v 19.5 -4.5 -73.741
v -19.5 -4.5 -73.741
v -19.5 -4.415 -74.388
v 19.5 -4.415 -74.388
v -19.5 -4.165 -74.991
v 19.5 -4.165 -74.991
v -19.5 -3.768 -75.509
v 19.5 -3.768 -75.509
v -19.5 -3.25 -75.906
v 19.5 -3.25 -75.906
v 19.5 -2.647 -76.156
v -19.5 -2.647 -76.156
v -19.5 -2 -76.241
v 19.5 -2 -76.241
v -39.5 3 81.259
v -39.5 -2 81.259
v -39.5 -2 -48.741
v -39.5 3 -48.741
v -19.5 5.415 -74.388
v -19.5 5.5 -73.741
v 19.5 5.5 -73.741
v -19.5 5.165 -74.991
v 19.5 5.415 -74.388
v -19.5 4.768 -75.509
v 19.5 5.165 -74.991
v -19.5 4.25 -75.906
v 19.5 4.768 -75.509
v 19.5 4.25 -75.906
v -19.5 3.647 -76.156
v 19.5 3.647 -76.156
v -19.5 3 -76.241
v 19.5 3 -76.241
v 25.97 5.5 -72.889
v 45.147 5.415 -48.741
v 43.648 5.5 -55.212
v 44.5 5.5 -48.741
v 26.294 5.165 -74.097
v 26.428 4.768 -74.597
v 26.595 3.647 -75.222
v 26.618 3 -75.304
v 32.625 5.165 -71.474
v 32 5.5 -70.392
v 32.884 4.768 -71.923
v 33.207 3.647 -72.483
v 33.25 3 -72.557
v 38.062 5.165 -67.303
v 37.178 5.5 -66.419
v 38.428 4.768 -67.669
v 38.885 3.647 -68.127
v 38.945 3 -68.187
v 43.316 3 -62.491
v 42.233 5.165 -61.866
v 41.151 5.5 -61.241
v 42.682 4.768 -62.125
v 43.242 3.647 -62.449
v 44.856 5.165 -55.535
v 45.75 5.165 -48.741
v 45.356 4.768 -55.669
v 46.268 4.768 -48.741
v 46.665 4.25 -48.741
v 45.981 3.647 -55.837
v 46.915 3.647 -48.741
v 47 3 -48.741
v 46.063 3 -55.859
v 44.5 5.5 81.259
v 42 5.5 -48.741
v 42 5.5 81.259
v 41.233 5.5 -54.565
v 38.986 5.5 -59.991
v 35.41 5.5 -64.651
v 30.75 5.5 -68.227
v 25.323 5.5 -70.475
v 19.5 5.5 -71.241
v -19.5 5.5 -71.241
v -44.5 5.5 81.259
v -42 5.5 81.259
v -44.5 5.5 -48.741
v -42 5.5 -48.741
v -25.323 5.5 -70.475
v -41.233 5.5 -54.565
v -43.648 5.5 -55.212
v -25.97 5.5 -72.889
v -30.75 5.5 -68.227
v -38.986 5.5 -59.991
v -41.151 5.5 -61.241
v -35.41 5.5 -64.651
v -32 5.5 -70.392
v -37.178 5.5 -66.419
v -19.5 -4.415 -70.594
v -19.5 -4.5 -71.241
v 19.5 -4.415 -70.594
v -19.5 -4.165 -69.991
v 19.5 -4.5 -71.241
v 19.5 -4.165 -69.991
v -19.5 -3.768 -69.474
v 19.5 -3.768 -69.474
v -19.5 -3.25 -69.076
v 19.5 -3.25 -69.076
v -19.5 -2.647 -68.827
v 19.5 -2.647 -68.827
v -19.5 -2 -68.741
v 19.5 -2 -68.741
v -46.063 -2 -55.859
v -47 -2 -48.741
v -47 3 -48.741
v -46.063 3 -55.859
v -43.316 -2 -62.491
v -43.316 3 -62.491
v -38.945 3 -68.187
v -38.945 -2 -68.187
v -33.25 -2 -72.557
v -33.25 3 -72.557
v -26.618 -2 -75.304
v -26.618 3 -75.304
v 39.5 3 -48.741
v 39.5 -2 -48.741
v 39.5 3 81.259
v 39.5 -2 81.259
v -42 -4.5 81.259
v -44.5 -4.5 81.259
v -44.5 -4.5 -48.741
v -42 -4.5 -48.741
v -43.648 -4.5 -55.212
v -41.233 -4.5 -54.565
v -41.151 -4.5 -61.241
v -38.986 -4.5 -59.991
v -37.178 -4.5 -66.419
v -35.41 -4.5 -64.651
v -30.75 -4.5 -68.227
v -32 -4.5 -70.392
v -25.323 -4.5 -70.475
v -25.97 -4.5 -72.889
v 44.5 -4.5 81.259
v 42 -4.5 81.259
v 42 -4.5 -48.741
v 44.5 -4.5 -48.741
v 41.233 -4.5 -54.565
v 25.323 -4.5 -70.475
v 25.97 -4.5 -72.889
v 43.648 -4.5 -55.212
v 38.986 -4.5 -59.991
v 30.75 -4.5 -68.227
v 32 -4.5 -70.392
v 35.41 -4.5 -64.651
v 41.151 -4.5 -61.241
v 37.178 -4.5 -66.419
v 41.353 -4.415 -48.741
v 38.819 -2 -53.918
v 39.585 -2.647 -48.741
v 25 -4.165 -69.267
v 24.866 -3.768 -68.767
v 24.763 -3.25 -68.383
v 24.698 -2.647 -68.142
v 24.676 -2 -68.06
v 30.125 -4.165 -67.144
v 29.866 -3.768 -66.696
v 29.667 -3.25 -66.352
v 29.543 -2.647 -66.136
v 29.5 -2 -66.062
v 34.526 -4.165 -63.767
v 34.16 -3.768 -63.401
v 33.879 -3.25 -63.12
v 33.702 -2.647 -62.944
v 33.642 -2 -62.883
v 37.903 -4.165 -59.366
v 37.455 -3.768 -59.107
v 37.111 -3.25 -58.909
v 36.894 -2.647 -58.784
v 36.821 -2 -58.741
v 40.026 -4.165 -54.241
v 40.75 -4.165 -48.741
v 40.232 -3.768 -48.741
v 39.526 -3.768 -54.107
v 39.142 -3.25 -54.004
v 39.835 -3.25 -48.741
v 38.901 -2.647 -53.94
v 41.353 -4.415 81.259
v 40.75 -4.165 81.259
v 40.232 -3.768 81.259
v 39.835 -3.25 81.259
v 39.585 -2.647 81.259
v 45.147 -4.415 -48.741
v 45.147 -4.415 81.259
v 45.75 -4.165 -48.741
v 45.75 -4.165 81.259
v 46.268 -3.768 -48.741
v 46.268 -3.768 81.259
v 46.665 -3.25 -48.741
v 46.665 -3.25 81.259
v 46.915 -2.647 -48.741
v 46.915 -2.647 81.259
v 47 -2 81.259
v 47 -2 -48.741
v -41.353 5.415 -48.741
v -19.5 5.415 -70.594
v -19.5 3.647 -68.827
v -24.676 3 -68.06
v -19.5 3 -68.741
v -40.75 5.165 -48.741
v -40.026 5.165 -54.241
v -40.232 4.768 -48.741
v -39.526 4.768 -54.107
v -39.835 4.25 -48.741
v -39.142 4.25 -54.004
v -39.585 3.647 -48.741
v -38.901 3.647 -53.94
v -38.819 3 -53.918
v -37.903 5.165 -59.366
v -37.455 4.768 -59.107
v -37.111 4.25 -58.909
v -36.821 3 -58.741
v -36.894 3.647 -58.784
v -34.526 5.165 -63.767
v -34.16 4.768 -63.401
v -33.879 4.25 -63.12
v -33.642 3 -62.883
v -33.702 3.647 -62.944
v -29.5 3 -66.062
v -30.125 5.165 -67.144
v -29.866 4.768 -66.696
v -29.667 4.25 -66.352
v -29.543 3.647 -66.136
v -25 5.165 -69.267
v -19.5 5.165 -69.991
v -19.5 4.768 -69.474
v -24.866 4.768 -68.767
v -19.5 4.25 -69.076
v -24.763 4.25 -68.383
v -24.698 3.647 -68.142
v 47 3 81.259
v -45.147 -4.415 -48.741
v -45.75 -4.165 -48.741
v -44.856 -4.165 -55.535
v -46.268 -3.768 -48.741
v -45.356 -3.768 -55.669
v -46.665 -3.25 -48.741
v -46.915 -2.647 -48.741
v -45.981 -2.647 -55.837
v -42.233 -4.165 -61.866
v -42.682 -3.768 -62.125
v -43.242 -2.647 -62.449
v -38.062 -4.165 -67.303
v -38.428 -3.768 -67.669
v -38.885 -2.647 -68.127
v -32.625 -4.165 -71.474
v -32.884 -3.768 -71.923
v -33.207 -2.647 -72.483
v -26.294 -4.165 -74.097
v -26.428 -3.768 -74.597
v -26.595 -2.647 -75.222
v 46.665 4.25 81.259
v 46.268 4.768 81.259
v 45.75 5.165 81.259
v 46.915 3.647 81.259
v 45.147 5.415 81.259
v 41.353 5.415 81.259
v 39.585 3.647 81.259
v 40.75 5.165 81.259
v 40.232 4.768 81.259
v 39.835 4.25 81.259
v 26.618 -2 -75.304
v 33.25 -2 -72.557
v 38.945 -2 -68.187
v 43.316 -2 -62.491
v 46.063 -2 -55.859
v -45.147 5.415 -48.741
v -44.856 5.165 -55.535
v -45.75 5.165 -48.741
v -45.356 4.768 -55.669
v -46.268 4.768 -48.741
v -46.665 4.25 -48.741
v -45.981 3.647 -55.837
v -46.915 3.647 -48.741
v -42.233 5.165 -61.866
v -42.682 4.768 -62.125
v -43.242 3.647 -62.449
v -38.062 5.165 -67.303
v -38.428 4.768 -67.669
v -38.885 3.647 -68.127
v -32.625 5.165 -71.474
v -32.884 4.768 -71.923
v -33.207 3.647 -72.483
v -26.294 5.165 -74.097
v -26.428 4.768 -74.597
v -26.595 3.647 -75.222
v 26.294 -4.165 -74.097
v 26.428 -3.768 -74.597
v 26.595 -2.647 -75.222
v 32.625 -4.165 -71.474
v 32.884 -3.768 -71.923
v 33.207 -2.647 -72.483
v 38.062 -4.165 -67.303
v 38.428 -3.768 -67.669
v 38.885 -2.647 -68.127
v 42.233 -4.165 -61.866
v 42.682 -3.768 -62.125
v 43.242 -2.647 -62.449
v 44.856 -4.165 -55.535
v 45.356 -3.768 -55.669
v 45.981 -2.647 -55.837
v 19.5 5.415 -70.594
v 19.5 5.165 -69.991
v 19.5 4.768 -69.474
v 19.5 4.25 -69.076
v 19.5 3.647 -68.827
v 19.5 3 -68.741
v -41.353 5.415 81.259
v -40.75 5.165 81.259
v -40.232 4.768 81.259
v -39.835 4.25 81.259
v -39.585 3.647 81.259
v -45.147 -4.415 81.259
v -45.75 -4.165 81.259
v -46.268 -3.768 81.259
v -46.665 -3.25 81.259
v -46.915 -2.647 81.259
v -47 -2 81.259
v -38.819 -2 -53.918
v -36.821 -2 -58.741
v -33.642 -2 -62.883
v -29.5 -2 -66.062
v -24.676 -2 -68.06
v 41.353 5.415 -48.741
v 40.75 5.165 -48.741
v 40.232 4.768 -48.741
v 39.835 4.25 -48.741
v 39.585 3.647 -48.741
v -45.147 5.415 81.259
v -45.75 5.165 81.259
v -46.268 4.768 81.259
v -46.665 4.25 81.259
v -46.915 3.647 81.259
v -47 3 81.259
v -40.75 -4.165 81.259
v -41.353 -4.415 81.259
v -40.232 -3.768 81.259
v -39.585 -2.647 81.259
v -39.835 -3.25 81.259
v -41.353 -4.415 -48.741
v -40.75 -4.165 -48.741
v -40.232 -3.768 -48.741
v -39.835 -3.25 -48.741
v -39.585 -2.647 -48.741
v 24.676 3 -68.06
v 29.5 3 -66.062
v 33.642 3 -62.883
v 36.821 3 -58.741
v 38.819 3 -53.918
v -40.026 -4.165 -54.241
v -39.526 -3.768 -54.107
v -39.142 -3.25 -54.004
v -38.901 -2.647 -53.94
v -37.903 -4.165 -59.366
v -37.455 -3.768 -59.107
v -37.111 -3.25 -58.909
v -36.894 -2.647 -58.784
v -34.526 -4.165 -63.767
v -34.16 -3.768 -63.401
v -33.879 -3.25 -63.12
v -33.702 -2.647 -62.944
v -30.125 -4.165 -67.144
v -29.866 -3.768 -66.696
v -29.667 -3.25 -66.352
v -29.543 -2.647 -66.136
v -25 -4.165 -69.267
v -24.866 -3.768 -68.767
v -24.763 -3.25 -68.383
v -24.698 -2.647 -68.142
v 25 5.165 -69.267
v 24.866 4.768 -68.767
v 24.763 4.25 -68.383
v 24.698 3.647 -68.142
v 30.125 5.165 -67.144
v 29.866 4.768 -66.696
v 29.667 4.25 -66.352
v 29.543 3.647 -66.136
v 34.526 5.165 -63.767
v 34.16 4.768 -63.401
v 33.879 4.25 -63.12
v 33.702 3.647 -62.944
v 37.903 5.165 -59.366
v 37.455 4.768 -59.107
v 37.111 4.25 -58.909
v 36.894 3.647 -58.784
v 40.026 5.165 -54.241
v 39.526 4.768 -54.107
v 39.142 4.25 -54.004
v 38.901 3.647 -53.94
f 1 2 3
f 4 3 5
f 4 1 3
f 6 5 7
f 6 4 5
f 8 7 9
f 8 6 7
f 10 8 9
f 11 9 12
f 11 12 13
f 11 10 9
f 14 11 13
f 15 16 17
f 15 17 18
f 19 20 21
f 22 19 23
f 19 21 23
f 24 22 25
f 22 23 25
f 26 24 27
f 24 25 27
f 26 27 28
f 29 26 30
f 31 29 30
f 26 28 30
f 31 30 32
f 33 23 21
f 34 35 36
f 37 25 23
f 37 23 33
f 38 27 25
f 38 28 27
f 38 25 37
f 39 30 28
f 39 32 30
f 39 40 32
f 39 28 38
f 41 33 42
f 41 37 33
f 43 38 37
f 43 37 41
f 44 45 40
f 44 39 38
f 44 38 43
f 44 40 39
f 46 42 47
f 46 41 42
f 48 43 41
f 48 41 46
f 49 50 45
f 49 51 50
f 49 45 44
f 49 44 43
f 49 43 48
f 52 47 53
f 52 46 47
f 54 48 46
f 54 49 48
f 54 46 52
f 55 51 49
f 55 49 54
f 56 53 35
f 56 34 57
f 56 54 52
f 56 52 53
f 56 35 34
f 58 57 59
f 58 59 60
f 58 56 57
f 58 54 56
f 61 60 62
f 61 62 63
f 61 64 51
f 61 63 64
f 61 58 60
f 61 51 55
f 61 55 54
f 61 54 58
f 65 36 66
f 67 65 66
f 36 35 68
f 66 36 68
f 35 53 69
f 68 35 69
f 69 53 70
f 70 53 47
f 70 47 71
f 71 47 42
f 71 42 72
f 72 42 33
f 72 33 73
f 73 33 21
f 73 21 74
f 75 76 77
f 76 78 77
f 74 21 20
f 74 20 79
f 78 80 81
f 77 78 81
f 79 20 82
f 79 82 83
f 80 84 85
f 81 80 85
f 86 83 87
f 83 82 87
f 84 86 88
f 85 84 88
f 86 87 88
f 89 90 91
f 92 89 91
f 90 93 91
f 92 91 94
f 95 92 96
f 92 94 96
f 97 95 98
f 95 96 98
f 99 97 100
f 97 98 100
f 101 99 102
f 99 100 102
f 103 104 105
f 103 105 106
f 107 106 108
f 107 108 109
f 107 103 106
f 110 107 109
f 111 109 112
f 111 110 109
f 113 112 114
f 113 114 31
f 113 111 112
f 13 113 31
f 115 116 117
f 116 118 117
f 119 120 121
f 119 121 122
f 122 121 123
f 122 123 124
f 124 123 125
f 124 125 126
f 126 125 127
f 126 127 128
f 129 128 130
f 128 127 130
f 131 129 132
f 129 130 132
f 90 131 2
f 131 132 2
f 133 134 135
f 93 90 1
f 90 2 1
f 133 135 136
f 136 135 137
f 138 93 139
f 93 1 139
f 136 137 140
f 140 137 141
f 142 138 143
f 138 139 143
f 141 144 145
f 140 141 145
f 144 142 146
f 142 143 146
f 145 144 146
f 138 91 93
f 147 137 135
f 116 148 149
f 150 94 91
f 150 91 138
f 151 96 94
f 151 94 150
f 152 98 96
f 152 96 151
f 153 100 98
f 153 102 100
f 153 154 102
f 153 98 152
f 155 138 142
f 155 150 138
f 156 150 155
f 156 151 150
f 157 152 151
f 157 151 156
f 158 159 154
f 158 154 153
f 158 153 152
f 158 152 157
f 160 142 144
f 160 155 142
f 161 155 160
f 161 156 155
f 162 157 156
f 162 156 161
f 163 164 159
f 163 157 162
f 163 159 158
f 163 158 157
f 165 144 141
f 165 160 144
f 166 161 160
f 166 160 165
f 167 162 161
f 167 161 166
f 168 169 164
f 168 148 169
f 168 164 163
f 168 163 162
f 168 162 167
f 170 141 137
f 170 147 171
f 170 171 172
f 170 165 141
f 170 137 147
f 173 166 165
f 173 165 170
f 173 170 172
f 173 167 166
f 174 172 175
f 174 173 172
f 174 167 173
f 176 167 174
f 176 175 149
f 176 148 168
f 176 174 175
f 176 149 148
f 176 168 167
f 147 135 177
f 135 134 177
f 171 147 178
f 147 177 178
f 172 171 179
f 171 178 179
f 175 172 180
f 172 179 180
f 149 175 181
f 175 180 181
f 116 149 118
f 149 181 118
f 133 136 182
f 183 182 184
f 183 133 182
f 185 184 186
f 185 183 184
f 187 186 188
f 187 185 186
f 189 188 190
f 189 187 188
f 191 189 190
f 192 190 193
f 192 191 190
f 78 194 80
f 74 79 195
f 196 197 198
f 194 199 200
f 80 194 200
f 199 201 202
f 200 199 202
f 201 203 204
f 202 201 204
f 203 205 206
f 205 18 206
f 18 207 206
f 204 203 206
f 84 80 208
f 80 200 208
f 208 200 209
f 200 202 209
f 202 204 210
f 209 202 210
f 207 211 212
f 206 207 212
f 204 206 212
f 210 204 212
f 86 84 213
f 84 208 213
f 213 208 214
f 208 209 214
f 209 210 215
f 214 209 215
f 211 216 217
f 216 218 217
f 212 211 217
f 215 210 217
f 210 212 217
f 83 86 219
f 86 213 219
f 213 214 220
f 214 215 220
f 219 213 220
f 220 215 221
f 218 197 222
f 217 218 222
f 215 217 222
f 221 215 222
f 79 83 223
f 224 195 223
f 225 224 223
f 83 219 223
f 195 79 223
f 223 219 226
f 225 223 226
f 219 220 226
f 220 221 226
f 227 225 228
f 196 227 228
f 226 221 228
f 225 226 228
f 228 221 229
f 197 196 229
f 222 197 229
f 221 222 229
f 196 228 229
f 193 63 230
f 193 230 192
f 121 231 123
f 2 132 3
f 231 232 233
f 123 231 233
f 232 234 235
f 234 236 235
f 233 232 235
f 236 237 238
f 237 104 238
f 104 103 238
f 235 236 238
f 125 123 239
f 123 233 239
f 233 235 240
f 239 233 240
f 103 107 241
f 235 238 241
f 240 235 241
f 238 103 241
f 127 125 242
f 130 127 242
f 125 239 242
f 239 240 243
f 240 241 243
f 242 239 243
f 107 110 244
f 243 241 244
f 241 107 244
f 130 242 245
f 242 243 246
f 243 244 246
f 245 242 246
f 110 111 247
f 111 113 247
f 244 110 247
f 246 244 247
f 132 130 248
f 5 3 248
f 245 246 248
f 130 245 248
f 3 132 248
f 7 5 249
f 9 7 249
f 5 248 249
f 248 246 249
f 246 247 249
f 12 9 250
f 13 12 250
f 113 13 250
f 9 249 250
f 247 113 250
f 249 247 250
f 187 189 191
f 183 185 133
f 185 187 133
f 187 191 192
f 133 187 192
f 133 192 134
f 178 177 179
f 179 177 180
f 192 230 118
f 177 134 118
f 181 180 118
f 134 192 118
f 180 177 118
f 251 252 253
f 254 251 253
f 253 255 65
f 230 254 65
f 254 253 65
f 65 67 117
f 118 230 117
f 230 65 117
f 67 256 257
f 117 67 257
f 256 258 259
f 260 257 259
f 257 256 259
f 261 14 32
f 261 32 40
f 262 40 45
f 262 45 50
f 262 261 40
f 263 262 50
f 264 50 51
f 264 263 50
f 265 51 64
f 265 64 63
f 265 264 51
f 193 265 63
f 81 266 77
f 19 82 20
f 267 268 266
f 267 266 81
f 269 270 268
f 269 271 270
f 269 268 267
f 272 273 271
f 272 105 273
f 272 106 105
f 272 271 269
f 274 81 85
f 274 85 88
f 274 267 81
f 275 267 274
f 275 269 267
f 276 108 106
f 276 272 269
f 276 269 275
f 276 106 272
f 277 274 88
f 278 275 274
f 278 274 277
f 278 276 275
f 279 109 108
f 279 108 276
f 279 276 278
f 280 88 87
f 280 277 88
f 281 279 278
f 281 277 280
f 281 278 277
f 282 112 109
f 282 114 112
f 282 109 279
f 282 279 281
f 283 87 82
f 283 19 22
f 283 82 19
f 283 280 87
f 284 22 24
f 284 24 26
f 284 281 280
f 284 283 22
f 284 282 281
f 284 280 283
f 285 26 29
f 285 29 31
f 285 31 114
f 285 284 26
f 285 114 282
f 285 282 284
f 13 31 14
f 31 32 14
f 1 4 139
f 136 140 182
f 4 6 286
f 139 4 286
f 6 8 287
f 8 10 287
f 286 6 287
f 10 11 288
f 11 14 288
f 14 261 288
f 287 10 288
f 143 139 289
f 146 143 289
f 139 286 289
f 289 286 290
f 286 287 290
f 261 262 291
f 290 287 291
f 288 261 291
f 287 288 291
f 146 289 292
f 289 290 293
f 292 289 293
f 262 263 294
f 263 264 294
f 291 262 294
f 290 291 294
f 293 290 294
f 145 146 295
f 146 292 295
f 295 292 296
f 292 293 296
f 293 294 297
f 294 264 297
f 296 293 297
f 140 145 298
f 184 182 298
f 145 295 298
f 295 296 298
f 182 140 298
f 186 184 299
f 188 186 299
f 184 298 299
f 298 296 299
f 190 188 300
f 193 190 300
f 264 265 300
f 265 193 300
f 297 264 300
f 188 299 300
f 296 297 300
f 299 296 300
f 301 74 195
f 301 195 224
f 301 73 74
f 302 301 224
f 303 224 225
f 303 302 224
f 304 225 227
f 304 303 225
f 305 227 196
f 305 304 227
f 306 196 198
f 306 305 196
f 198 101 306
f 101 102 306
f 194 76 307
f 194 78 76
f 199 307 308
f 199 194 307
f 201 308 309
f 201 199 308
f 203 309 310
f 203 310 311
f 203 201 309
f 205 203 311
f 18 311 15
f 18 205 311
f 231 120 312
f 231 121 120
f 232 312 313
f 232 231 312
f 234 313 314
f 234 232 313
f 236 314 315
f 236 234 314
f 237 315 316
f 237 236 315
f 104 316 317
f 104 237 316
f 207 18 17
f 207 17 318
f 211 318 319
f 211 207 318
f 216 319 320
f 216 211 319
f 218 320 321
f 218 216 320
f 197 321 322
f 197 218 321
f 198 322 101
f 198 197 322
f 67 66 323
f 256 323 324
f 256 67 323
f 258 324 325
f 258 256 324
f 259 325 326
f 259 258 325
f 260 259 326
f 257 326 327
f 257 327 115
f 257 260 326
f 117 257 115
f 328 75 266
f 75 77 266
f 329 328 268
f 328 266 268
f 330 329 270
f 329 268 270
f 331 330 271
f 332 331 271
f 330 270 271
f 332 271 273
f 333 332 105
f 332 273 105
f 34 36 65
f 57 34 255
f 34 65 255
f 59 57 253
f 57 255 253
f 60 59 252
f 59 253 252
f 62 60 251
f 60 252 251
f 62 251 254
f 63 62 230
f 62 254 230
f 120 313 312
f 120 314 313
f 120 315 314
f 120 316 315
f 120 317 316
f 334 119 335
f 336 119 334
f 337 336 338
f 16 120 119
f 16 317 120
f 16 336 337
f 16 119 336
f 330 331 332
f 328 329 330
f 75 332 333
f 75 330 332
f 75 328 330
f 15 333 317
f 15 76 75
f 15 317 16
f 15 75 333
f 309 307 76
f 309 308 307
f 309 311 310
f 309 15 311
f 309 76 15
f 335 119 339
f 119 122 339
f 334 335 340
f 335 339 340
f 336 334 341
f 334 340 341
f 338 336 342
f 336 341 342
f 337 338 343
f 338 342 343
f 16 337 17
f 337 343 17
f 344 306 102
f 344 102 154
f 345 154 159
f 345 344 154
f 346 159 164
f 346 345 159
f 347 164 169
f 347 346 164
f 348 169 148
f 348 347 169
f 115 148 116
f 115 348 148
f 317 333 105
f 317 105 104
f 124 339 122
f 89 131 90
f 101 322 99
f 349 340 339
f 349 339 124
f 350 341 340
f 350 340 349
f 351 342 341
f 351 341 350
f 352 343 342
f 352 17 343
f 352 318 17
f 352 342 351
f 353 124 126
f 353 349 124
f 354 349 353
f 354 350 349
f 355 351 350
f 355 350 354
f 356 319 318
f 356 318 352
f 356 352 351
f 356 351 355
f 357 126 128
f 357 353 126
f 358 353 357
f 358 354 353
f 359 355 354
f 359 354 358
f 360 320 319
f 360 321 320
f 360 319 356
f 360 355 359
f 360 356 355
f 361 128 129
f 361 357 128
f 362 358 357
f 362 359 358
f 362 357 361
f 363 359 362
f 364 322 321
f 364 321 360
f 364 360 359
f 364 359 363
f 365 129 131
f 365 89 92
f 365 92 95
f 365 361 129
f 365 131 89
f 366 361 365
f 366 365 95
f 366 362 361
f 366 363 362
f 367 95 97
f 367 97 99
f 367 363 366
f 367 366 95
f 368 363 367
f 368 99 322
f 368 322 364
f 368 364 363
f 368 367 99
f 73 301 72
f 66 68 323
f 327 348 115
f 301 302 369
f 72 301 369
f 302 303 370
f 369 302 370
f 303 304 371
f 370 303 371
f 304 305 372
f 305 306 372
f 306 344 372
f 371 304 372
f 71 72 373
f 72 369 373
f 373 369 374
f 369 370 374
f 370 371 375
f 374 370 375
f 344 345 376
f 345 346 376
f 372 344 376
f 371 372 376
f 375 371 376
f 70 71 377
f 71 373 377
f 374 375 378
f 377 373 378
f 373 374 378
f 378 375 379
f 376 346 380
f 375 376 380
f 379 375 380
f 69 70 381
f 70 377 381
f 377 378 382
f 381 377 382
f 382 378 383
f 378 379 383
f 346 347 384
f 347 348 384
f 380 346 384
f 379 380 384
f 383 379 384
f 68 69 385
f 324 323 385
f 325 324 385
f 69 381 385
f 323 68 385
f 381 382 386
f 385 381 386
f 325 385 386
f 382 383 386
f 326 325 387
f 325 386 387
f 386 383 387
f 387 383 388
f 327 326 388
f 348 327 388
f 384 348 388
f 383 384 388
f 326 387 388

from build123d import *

# Parameters (mm, degrees)
SKETCH2_W    = 0.75
SKETCH2_H    = 1
FILLET1_R    = 0.25
SCALE1_SCALE = 10


with BuildPart() as part:
    # Sweep1: sweep along a path in Sketch1
    with BuildLine(Plane(origin=(0, 0, 0), x_dir=(1, 0, 0), z_dir=(0, 1, 0))) as sweep1_path:
        Line((-3.95, 0), (-3.95, 13))
        ThreePointArc((-3.95, 13), (-3.364213562, 14.414213562), (-1.95, 15))
        Line((-1.95, 15), (1.95, 15))
        ThreePointArc((1.95, 15), (3.364213562, 14.414213562), (3.95, 13))
        Line((3.95, 13), (3.95, 0))
    # Sketch2 → Sweep1 (sweep)
    with BuildSketch(Plane.XY):
        with Locations((-4.325, 0.5)):
            Rectangle(SKETCH2_W, SKETCH2_H)
    sweep(path=sweep1_path.line)

    # Fillet1
    fillet1_edges = [part.edges().sort_by_distance(p)[0] for p in [
        (3.95, 1, -6.5),
        (4.7, 1, -6.5),
        (4.7, 0, -6.5),
        (-3.95, 0, -6.5),
        (-3.95, 1, -6.5),
        (-4.7, 1, -6.5),
        (-4.7, 0, -6.5),
        (-3.364213562, 0, -14.414213562),
        (-3.364213562, 1, -14.414213562),
        (-3.894543648, 1, -14.944543648),
        (-3.894543648, 0, -14.944543648),
        (0, 0, -15),
        (0, 1, -15),
        (0, 1, -15.75),
        (0, 0, -15.75),
        (3.364213562, 0, -14.414213562),
        (3.364213562, 1, -14.414213562),
        (3.894543648, 1, -14.944543648),
        (3.894543648, 0, -14.944543648),
        (3.95, 0, -6.5),
    ]]
    fillet(fillet1_edges, radius=FILLET1_R)


with BuildPart() as part_1:
    # Scale1: scaled about (0, 0.5, -9.028741483)
    add(part.part.scale(SCALE1_SCALE).moved(Location((0, -4.5, 81.258673347))))


solid = part_1.part
